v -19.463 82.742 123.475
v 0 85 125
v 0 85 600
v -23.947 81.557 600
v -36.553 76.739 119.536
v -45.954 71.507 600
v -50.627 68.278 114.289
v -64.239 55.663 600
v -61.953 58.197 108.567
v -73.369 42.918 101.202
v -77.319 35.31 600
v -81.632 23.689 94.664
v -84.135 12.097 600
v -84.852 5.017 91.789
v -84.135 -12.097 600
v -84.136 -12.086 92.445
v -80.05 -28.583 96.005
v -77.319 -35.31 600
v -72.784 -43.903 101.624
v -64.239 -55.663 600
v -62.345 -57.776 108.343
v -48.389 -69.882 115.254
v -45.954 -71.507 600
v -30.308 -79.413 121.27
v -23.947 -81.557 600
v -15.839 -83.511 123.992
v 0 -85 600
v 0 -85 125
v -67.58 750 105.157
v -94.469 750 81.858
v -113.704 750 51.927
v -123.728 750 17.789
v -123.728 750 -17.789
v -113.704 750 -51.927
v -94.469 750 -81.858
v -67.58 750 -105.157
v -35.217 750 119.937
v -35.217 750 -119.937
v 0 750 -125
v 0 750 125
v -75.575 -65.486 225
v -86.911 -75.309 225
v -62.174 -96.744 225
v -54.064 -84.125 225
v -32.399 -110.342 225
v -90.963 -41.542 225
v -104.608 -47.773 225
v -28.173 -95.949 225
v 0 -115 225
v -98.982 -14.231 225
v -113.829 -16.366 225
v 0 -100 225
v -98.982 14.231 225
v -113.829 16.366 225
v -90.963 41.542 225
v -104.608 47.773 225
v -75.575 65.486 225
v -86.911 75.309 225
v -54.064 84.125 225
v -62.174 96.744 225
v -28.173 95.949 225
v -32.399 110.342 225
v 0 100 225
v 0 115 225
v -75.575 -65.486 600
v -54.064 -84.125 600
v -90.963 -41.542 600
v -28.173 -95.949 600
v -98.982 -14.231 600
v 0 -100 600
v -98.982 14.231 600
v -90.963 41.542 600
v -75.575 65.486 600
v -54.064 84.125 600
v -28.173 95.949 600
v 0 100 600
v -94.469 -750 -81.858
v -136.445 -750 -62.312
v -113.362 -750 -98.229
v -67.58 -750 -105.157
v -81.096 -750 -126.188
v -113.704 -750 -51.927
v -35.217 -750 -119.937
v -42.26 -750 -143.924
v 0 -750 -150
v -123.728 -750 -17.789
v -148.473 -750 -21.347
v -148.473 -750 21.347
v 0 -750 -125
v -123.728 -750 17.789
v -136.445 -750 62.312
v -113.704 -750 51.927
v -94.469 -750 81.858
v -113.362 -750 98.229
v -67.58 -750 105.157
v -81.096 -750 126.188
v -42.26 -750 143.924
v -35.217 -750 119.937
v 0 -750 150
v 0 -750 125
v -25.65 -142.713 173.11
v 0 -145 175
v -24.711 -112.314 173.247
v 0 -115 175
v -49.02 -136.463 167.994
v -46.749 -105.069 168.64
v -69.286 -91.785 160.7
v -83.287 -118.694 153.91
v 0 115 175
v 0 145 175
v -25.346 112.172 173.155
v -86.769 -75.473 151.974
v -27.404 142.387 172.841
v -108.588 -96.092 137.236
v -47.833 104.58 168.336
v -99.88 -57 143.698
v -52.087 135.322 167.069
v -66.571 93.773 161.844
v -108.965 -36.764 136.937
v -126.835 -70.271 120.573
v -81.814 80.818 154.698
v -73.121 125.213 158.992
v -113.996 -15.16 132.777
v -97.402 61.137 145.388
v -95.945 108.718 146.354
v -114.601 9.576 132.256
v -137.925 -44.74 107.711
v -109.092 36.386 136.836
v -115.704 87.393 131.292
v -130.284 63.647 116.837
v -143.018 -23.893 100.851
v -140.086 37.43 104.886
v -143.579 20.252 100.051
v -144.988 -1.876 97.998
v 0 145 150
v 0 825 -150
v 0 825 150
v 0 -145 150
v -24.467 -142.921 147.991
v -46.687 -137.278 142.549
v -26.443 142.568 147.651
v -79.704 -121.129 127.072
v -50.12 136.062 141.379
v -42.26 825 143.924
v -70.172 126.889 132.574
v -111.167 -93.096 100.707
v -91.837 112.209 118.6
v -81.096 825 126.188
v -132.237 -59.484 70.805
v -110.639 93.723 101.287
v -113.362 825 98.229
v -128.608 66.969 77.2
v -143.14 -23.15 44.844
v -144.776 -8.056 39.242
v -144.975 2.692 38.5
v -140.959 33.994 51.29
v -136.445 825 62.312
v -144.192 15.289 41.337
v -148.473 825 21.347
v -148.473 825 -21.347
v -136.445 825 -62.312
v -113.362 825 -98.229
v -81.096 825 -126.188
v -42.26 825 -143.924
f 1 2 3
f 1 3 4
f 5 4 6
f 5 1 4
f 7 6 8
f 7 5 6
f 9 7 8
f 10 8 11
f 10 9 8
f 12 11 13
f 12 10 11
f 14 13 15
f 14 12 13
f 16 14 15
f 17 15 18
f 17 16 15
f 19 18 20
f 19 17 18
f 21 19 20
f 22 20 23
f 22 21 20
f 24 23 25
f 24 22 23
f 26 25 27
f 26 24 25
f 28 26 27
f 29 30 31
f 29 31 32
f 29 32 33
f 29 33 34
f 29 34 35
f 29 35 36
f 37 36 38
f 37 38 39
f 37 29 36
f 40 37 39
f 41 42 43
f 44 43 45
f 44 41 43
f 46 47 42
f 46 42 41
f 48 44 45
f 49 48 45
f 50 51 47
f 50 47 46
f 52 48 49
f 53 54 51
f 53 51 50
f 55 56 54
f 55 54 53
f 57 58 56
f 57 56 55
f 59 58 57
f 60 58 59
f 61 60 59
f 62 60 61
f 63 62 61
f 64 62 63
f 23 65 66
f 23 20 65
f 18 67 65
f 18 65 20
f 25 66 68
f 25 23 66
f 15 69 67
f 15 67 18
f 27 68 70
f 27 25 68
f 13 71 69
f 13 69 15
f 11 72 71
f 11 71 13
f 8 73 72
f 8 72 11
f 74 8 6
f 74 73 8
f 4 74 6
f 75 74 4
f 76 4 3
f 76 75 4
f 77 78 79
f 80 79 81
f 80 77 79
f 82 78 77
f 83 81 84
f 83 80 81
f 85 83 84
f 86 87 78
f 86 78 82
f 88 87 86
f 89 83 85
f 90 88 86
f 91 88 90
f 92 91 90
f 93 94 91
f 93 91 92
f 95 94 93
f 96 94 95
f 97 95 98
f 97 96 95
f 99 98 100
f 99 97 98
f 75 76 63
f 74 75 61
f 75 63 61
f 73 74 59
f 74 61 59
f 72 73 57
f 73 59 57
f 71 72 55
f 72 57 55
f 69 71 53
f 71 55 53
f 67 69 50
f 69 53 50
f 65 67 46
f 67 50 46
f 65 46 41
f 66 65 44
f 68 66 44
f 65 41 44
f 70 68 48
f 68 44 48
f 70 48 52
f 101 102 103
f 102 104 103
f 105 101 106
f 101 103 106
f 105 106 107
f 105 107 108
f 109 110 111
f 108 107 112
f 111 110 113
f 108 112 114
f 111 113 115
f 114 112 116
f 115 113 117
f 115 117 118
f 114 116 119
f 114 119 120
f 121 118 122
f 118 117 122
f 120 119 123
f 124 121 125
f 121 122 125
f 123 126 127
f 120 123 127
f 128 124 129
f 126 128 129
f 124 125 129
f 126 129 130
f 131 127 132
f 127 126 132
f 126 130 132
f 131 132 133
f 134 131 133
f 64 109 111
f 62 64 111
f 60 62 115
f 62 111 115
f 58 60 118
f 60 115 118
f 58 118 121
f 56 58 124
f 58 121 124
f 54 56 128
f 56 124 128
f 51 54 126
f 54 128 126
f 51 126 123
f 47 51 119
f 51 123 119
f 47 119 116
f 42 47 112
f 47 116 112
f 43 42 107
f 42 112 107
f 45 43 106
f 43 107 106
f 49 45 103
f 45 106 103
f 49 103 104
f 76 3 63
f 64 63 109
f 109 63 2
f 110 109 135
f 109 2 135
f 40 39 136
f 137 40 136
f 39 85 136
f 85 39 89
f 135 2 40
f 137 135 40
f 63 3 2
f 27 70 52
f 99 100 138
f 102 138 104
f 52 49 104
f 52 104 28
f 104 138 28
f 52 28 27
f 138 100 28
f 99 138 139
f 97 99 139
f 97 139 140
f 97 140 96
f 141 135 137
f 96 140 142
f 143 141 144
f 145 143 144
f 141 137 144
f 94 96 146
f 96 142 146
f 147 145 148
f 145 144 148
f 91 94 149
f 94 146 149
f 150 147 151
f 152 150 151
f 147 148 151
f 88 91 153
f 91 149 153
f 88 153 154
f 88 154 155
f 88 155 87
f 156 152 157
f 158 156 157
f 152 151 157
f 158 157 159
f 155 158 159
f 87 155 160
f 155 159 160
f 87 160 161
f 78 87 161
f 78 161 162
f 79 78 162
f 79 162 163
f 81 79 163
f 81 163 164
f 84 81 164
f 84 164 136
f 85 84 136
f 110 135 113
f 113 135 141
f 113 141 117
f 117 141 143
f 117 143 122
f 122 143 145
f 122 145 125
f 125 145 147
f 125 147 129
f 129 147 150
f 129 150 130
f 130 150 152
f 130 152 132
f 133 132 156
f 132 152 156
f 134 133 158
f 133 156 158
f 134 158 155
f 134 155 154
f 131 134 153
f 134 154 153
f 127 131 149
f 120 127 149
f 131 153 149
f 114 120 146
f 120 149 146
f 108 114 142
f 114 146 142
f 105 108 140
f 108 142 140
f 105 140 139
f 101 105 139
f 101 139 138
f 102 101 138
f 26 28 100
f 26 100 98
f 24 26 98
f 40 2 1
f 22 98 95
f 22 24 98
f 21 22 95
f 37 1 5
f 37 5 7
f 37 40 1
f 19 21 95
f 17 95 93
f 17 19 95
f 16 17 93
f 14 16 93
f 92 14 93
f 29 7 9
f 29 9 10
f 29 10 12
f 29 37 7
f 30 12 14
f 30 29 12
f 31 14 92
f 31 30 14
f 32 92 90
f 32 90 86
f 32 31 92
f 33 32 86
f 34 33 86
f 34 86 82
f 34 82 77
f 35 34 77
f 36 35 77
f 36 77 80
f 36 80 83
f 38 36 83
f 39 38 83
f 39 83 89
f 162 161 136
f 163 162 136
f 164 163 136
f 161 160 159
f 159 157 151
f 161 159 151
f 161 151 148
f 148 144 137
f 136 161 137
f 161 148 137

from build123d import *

# Parameters (mm, degrees)
BOX001_W               = 500
BOX001_H               = 1800
BOX001_DEPTH           = 1000
CYLINDER008_R          = 150
CYLINDER008_DEPTH      = 75
CYLINDER008_ROLL_ANGLE = 90
CYLINDER007_R          = 125
CYLINDER007_DEPTH      = 1500
CYLINDER007_ROLL_ANGLE = 90
CYLINDER006_R          = 85
CYLINDER006_DEPTH      = 600
CYLINDER002_R          = 115
CYLINDER002_DEPTH      = 225
CYLINDER001_R          = 150
CYLINDER001_DEPTH      = 1500
CYLINDER001_ROLL_ANGLE = 90
CYLINDER_R             = 100
CYLINDER_DEPTH         = 600
BOX_W                  = 500
BOX_H                  = 500
BOX_DEPTH              = 500
CYLINDER004_R          = 145
CYLINDER004_DEPTH      = 600
CYLINDER005_R          = 300
CYLINDER005_DEPTH      = 600
CYLINDER003_R          = 175
CYLINDER003_DEPTH      = 400
CYLINDER003_ROLL_ANGLE = 90


with BuildPart() as cube001:
    # Box001 → Box001 (new body)
    with BuildSketch(Plane(origin=(0, -815, -274), x_dir=(1, 0, 0), z_dir=(0, 0, 1))):
        with Locations((250, 900)):
            Rectangle(BOX001_W, BOX001_H)
    extrude(amount=BOX001_DEPTH)


with BuildPart() as cylinder008:
    # Cylinder008 → Cylinder008 (new body)
    with BuildSketch(Plane.XY):
        Circle(CYLINDER008_R)
    extrude(amount=CYLINDER008_DEPTH)


with BuildPart() as cylinder008_1:
    # Cylinder008 roll: moved
    add(cylinder008.part.rotate(Axis((0, 0, 0), (1, 0, 0)), CYLINDER008_ROLL_ANGLE))


with BuildPart() as cylinder008_2:
    # Cylinder008 placement: moved
    add(cylinder008_1.part.moved(Location((0, 825, 0))))


with BuildPart() as cylinder007:
    # Cylinder007 → Cylinder007 (new body)
    with BuildSketch(Plane.XY):
        Circle(CYLINDER007_R)
    extrude(amount=CYLINDER007_DEPTH)


with BuildPart() as cylinder007_1:
    # Cylinder007 roll: moved
    add(cylinder007.part.rotate(Axis((0, 0, 0), (1, 0, 0)), CYLINDER007_ROLL_ANGLE))


with BuildPart() as cylinder007_2:
    # Cylinder007 placement: moved
    add(cylinder007_1.part.moved(Location((0, 750, 0))))


with BuildPart() as cylinder006:
    # Cylinder006 → Cylinder006 (new body)
    with BuildSketch(Plane.XY):
        Circle(CYLINDER006_R)
    extrude(amount=CYLINDER006_DEPTH)


with BuildPart() as cylinder002:
    # Cylinder002 → Cylinder002 (new body)
    with BuildSketch(Plane.XY):
        Circle(CYLINDER002_R)
    extrude(amount=CYLINDER002_DEPTH)


with BuildPart() as cylinder001:
    # Cylinder001 → Cylinder001 (new body)
    with BuildSketch(Plane.XY):
        Circle(CYLINDER001_R)
    extrude(amount=CYLINDER001_DEPTH)


with BuildPart() as cylinder001_1:
    # Cylinder001 roll: moved
    add(cylinder001.part.rotate(Axis((0, 0, 0), (1, 0, 0)), CYLINDER001_ROLL_ANGLE))


with BuildPart() as cylinder001_2:
    # Cylinder001 placement: moved
    add(cylinder001_1.part.moved(Location((0, 750, 0))))


with BuildPart() as cylinder:
    # Cylinder → Cylinder (new body)
    with BuildSketch(Plane.XY):
        Circle(CYLINDER_R)
    extrude(amount=CYLINDER_DEPTH)


with BuildPart() as cube:
    # Box → Box (new body)
    with BuildSketch(Plane(origin=(-226, -279, -480), x_dir=(1, 0, 0), z_dir=(0, 0, 1))):
        with Locations((250, 250)):
            Rectangle(BOX_W, BOX_H)
    extrude(amount=BOX_DEPTH)


with BuildPart() as cylinder004:
    # Cylinder004 → Cylinder004 (new body)
    with BuildSketch(Plane.XY):
        Circle(CYLINDER004_R)
    extrude(amount=CYLINDER004_DEPTH)


with BuildPart() as cut:
    # Cylinder005 → Cylinder005 (new body)
    with BuildSketch(Plane.XY):
        Circle(CYLINDER005_R)
    extrude(amount=CYLINDER005_DEPTH)

    # Cut: cut Cylinder004
    add(cylinder004.part, mode=Mode.SUBTRACT)


with BuildPart() as cut005:
    # Cylinder003 → Cylinder003 (new body)
    with BuildSketch(Plane.XY):
        Circle(CYLINDER003_R)
    extrude(amount=CYLINDER003_DEPTH)


with BuildPart() as cut005_1:
    # Cylinder003 roll: moved
    add(cut005.part.rotate(Axis((0, 0, 0), (1, 0, 0)), CYLINDER003_ROLL_ANGLE))


with BuildPart() as cut005_2:
    # Cylinder003 placement: moved
    add(cut005_1.part.moved(Location((0, 200, 0))))

    # Cut001: cut Cut
    add(cut.part, mode=Mode.SUBTRACT)

    # Cut002: cut Cube
    add(cube.part, mode=Mode.SUBTRACT)

    # Fusion: union Cylinder002, Cylinder001, Cylinder
    add(cylinder002.part)
    add(cylinder001_2.part)
    add(cylinder.part)

    # Cut003: cut Cylinder006
    add(cylinder006.part, mode=Mode.SUBTRACT)

    # Cut004: cut Cylinder007
    add(cylinder007_2.part, mode=Mode.SUBTRACT)

    # Fusion001: union Cylinder008
    add(cylinder008_2.part)

    # Cut005: cut Cube001
    add(cube001.part, mode=Mode.SUBTRACT)


solid = cut005_2.part
